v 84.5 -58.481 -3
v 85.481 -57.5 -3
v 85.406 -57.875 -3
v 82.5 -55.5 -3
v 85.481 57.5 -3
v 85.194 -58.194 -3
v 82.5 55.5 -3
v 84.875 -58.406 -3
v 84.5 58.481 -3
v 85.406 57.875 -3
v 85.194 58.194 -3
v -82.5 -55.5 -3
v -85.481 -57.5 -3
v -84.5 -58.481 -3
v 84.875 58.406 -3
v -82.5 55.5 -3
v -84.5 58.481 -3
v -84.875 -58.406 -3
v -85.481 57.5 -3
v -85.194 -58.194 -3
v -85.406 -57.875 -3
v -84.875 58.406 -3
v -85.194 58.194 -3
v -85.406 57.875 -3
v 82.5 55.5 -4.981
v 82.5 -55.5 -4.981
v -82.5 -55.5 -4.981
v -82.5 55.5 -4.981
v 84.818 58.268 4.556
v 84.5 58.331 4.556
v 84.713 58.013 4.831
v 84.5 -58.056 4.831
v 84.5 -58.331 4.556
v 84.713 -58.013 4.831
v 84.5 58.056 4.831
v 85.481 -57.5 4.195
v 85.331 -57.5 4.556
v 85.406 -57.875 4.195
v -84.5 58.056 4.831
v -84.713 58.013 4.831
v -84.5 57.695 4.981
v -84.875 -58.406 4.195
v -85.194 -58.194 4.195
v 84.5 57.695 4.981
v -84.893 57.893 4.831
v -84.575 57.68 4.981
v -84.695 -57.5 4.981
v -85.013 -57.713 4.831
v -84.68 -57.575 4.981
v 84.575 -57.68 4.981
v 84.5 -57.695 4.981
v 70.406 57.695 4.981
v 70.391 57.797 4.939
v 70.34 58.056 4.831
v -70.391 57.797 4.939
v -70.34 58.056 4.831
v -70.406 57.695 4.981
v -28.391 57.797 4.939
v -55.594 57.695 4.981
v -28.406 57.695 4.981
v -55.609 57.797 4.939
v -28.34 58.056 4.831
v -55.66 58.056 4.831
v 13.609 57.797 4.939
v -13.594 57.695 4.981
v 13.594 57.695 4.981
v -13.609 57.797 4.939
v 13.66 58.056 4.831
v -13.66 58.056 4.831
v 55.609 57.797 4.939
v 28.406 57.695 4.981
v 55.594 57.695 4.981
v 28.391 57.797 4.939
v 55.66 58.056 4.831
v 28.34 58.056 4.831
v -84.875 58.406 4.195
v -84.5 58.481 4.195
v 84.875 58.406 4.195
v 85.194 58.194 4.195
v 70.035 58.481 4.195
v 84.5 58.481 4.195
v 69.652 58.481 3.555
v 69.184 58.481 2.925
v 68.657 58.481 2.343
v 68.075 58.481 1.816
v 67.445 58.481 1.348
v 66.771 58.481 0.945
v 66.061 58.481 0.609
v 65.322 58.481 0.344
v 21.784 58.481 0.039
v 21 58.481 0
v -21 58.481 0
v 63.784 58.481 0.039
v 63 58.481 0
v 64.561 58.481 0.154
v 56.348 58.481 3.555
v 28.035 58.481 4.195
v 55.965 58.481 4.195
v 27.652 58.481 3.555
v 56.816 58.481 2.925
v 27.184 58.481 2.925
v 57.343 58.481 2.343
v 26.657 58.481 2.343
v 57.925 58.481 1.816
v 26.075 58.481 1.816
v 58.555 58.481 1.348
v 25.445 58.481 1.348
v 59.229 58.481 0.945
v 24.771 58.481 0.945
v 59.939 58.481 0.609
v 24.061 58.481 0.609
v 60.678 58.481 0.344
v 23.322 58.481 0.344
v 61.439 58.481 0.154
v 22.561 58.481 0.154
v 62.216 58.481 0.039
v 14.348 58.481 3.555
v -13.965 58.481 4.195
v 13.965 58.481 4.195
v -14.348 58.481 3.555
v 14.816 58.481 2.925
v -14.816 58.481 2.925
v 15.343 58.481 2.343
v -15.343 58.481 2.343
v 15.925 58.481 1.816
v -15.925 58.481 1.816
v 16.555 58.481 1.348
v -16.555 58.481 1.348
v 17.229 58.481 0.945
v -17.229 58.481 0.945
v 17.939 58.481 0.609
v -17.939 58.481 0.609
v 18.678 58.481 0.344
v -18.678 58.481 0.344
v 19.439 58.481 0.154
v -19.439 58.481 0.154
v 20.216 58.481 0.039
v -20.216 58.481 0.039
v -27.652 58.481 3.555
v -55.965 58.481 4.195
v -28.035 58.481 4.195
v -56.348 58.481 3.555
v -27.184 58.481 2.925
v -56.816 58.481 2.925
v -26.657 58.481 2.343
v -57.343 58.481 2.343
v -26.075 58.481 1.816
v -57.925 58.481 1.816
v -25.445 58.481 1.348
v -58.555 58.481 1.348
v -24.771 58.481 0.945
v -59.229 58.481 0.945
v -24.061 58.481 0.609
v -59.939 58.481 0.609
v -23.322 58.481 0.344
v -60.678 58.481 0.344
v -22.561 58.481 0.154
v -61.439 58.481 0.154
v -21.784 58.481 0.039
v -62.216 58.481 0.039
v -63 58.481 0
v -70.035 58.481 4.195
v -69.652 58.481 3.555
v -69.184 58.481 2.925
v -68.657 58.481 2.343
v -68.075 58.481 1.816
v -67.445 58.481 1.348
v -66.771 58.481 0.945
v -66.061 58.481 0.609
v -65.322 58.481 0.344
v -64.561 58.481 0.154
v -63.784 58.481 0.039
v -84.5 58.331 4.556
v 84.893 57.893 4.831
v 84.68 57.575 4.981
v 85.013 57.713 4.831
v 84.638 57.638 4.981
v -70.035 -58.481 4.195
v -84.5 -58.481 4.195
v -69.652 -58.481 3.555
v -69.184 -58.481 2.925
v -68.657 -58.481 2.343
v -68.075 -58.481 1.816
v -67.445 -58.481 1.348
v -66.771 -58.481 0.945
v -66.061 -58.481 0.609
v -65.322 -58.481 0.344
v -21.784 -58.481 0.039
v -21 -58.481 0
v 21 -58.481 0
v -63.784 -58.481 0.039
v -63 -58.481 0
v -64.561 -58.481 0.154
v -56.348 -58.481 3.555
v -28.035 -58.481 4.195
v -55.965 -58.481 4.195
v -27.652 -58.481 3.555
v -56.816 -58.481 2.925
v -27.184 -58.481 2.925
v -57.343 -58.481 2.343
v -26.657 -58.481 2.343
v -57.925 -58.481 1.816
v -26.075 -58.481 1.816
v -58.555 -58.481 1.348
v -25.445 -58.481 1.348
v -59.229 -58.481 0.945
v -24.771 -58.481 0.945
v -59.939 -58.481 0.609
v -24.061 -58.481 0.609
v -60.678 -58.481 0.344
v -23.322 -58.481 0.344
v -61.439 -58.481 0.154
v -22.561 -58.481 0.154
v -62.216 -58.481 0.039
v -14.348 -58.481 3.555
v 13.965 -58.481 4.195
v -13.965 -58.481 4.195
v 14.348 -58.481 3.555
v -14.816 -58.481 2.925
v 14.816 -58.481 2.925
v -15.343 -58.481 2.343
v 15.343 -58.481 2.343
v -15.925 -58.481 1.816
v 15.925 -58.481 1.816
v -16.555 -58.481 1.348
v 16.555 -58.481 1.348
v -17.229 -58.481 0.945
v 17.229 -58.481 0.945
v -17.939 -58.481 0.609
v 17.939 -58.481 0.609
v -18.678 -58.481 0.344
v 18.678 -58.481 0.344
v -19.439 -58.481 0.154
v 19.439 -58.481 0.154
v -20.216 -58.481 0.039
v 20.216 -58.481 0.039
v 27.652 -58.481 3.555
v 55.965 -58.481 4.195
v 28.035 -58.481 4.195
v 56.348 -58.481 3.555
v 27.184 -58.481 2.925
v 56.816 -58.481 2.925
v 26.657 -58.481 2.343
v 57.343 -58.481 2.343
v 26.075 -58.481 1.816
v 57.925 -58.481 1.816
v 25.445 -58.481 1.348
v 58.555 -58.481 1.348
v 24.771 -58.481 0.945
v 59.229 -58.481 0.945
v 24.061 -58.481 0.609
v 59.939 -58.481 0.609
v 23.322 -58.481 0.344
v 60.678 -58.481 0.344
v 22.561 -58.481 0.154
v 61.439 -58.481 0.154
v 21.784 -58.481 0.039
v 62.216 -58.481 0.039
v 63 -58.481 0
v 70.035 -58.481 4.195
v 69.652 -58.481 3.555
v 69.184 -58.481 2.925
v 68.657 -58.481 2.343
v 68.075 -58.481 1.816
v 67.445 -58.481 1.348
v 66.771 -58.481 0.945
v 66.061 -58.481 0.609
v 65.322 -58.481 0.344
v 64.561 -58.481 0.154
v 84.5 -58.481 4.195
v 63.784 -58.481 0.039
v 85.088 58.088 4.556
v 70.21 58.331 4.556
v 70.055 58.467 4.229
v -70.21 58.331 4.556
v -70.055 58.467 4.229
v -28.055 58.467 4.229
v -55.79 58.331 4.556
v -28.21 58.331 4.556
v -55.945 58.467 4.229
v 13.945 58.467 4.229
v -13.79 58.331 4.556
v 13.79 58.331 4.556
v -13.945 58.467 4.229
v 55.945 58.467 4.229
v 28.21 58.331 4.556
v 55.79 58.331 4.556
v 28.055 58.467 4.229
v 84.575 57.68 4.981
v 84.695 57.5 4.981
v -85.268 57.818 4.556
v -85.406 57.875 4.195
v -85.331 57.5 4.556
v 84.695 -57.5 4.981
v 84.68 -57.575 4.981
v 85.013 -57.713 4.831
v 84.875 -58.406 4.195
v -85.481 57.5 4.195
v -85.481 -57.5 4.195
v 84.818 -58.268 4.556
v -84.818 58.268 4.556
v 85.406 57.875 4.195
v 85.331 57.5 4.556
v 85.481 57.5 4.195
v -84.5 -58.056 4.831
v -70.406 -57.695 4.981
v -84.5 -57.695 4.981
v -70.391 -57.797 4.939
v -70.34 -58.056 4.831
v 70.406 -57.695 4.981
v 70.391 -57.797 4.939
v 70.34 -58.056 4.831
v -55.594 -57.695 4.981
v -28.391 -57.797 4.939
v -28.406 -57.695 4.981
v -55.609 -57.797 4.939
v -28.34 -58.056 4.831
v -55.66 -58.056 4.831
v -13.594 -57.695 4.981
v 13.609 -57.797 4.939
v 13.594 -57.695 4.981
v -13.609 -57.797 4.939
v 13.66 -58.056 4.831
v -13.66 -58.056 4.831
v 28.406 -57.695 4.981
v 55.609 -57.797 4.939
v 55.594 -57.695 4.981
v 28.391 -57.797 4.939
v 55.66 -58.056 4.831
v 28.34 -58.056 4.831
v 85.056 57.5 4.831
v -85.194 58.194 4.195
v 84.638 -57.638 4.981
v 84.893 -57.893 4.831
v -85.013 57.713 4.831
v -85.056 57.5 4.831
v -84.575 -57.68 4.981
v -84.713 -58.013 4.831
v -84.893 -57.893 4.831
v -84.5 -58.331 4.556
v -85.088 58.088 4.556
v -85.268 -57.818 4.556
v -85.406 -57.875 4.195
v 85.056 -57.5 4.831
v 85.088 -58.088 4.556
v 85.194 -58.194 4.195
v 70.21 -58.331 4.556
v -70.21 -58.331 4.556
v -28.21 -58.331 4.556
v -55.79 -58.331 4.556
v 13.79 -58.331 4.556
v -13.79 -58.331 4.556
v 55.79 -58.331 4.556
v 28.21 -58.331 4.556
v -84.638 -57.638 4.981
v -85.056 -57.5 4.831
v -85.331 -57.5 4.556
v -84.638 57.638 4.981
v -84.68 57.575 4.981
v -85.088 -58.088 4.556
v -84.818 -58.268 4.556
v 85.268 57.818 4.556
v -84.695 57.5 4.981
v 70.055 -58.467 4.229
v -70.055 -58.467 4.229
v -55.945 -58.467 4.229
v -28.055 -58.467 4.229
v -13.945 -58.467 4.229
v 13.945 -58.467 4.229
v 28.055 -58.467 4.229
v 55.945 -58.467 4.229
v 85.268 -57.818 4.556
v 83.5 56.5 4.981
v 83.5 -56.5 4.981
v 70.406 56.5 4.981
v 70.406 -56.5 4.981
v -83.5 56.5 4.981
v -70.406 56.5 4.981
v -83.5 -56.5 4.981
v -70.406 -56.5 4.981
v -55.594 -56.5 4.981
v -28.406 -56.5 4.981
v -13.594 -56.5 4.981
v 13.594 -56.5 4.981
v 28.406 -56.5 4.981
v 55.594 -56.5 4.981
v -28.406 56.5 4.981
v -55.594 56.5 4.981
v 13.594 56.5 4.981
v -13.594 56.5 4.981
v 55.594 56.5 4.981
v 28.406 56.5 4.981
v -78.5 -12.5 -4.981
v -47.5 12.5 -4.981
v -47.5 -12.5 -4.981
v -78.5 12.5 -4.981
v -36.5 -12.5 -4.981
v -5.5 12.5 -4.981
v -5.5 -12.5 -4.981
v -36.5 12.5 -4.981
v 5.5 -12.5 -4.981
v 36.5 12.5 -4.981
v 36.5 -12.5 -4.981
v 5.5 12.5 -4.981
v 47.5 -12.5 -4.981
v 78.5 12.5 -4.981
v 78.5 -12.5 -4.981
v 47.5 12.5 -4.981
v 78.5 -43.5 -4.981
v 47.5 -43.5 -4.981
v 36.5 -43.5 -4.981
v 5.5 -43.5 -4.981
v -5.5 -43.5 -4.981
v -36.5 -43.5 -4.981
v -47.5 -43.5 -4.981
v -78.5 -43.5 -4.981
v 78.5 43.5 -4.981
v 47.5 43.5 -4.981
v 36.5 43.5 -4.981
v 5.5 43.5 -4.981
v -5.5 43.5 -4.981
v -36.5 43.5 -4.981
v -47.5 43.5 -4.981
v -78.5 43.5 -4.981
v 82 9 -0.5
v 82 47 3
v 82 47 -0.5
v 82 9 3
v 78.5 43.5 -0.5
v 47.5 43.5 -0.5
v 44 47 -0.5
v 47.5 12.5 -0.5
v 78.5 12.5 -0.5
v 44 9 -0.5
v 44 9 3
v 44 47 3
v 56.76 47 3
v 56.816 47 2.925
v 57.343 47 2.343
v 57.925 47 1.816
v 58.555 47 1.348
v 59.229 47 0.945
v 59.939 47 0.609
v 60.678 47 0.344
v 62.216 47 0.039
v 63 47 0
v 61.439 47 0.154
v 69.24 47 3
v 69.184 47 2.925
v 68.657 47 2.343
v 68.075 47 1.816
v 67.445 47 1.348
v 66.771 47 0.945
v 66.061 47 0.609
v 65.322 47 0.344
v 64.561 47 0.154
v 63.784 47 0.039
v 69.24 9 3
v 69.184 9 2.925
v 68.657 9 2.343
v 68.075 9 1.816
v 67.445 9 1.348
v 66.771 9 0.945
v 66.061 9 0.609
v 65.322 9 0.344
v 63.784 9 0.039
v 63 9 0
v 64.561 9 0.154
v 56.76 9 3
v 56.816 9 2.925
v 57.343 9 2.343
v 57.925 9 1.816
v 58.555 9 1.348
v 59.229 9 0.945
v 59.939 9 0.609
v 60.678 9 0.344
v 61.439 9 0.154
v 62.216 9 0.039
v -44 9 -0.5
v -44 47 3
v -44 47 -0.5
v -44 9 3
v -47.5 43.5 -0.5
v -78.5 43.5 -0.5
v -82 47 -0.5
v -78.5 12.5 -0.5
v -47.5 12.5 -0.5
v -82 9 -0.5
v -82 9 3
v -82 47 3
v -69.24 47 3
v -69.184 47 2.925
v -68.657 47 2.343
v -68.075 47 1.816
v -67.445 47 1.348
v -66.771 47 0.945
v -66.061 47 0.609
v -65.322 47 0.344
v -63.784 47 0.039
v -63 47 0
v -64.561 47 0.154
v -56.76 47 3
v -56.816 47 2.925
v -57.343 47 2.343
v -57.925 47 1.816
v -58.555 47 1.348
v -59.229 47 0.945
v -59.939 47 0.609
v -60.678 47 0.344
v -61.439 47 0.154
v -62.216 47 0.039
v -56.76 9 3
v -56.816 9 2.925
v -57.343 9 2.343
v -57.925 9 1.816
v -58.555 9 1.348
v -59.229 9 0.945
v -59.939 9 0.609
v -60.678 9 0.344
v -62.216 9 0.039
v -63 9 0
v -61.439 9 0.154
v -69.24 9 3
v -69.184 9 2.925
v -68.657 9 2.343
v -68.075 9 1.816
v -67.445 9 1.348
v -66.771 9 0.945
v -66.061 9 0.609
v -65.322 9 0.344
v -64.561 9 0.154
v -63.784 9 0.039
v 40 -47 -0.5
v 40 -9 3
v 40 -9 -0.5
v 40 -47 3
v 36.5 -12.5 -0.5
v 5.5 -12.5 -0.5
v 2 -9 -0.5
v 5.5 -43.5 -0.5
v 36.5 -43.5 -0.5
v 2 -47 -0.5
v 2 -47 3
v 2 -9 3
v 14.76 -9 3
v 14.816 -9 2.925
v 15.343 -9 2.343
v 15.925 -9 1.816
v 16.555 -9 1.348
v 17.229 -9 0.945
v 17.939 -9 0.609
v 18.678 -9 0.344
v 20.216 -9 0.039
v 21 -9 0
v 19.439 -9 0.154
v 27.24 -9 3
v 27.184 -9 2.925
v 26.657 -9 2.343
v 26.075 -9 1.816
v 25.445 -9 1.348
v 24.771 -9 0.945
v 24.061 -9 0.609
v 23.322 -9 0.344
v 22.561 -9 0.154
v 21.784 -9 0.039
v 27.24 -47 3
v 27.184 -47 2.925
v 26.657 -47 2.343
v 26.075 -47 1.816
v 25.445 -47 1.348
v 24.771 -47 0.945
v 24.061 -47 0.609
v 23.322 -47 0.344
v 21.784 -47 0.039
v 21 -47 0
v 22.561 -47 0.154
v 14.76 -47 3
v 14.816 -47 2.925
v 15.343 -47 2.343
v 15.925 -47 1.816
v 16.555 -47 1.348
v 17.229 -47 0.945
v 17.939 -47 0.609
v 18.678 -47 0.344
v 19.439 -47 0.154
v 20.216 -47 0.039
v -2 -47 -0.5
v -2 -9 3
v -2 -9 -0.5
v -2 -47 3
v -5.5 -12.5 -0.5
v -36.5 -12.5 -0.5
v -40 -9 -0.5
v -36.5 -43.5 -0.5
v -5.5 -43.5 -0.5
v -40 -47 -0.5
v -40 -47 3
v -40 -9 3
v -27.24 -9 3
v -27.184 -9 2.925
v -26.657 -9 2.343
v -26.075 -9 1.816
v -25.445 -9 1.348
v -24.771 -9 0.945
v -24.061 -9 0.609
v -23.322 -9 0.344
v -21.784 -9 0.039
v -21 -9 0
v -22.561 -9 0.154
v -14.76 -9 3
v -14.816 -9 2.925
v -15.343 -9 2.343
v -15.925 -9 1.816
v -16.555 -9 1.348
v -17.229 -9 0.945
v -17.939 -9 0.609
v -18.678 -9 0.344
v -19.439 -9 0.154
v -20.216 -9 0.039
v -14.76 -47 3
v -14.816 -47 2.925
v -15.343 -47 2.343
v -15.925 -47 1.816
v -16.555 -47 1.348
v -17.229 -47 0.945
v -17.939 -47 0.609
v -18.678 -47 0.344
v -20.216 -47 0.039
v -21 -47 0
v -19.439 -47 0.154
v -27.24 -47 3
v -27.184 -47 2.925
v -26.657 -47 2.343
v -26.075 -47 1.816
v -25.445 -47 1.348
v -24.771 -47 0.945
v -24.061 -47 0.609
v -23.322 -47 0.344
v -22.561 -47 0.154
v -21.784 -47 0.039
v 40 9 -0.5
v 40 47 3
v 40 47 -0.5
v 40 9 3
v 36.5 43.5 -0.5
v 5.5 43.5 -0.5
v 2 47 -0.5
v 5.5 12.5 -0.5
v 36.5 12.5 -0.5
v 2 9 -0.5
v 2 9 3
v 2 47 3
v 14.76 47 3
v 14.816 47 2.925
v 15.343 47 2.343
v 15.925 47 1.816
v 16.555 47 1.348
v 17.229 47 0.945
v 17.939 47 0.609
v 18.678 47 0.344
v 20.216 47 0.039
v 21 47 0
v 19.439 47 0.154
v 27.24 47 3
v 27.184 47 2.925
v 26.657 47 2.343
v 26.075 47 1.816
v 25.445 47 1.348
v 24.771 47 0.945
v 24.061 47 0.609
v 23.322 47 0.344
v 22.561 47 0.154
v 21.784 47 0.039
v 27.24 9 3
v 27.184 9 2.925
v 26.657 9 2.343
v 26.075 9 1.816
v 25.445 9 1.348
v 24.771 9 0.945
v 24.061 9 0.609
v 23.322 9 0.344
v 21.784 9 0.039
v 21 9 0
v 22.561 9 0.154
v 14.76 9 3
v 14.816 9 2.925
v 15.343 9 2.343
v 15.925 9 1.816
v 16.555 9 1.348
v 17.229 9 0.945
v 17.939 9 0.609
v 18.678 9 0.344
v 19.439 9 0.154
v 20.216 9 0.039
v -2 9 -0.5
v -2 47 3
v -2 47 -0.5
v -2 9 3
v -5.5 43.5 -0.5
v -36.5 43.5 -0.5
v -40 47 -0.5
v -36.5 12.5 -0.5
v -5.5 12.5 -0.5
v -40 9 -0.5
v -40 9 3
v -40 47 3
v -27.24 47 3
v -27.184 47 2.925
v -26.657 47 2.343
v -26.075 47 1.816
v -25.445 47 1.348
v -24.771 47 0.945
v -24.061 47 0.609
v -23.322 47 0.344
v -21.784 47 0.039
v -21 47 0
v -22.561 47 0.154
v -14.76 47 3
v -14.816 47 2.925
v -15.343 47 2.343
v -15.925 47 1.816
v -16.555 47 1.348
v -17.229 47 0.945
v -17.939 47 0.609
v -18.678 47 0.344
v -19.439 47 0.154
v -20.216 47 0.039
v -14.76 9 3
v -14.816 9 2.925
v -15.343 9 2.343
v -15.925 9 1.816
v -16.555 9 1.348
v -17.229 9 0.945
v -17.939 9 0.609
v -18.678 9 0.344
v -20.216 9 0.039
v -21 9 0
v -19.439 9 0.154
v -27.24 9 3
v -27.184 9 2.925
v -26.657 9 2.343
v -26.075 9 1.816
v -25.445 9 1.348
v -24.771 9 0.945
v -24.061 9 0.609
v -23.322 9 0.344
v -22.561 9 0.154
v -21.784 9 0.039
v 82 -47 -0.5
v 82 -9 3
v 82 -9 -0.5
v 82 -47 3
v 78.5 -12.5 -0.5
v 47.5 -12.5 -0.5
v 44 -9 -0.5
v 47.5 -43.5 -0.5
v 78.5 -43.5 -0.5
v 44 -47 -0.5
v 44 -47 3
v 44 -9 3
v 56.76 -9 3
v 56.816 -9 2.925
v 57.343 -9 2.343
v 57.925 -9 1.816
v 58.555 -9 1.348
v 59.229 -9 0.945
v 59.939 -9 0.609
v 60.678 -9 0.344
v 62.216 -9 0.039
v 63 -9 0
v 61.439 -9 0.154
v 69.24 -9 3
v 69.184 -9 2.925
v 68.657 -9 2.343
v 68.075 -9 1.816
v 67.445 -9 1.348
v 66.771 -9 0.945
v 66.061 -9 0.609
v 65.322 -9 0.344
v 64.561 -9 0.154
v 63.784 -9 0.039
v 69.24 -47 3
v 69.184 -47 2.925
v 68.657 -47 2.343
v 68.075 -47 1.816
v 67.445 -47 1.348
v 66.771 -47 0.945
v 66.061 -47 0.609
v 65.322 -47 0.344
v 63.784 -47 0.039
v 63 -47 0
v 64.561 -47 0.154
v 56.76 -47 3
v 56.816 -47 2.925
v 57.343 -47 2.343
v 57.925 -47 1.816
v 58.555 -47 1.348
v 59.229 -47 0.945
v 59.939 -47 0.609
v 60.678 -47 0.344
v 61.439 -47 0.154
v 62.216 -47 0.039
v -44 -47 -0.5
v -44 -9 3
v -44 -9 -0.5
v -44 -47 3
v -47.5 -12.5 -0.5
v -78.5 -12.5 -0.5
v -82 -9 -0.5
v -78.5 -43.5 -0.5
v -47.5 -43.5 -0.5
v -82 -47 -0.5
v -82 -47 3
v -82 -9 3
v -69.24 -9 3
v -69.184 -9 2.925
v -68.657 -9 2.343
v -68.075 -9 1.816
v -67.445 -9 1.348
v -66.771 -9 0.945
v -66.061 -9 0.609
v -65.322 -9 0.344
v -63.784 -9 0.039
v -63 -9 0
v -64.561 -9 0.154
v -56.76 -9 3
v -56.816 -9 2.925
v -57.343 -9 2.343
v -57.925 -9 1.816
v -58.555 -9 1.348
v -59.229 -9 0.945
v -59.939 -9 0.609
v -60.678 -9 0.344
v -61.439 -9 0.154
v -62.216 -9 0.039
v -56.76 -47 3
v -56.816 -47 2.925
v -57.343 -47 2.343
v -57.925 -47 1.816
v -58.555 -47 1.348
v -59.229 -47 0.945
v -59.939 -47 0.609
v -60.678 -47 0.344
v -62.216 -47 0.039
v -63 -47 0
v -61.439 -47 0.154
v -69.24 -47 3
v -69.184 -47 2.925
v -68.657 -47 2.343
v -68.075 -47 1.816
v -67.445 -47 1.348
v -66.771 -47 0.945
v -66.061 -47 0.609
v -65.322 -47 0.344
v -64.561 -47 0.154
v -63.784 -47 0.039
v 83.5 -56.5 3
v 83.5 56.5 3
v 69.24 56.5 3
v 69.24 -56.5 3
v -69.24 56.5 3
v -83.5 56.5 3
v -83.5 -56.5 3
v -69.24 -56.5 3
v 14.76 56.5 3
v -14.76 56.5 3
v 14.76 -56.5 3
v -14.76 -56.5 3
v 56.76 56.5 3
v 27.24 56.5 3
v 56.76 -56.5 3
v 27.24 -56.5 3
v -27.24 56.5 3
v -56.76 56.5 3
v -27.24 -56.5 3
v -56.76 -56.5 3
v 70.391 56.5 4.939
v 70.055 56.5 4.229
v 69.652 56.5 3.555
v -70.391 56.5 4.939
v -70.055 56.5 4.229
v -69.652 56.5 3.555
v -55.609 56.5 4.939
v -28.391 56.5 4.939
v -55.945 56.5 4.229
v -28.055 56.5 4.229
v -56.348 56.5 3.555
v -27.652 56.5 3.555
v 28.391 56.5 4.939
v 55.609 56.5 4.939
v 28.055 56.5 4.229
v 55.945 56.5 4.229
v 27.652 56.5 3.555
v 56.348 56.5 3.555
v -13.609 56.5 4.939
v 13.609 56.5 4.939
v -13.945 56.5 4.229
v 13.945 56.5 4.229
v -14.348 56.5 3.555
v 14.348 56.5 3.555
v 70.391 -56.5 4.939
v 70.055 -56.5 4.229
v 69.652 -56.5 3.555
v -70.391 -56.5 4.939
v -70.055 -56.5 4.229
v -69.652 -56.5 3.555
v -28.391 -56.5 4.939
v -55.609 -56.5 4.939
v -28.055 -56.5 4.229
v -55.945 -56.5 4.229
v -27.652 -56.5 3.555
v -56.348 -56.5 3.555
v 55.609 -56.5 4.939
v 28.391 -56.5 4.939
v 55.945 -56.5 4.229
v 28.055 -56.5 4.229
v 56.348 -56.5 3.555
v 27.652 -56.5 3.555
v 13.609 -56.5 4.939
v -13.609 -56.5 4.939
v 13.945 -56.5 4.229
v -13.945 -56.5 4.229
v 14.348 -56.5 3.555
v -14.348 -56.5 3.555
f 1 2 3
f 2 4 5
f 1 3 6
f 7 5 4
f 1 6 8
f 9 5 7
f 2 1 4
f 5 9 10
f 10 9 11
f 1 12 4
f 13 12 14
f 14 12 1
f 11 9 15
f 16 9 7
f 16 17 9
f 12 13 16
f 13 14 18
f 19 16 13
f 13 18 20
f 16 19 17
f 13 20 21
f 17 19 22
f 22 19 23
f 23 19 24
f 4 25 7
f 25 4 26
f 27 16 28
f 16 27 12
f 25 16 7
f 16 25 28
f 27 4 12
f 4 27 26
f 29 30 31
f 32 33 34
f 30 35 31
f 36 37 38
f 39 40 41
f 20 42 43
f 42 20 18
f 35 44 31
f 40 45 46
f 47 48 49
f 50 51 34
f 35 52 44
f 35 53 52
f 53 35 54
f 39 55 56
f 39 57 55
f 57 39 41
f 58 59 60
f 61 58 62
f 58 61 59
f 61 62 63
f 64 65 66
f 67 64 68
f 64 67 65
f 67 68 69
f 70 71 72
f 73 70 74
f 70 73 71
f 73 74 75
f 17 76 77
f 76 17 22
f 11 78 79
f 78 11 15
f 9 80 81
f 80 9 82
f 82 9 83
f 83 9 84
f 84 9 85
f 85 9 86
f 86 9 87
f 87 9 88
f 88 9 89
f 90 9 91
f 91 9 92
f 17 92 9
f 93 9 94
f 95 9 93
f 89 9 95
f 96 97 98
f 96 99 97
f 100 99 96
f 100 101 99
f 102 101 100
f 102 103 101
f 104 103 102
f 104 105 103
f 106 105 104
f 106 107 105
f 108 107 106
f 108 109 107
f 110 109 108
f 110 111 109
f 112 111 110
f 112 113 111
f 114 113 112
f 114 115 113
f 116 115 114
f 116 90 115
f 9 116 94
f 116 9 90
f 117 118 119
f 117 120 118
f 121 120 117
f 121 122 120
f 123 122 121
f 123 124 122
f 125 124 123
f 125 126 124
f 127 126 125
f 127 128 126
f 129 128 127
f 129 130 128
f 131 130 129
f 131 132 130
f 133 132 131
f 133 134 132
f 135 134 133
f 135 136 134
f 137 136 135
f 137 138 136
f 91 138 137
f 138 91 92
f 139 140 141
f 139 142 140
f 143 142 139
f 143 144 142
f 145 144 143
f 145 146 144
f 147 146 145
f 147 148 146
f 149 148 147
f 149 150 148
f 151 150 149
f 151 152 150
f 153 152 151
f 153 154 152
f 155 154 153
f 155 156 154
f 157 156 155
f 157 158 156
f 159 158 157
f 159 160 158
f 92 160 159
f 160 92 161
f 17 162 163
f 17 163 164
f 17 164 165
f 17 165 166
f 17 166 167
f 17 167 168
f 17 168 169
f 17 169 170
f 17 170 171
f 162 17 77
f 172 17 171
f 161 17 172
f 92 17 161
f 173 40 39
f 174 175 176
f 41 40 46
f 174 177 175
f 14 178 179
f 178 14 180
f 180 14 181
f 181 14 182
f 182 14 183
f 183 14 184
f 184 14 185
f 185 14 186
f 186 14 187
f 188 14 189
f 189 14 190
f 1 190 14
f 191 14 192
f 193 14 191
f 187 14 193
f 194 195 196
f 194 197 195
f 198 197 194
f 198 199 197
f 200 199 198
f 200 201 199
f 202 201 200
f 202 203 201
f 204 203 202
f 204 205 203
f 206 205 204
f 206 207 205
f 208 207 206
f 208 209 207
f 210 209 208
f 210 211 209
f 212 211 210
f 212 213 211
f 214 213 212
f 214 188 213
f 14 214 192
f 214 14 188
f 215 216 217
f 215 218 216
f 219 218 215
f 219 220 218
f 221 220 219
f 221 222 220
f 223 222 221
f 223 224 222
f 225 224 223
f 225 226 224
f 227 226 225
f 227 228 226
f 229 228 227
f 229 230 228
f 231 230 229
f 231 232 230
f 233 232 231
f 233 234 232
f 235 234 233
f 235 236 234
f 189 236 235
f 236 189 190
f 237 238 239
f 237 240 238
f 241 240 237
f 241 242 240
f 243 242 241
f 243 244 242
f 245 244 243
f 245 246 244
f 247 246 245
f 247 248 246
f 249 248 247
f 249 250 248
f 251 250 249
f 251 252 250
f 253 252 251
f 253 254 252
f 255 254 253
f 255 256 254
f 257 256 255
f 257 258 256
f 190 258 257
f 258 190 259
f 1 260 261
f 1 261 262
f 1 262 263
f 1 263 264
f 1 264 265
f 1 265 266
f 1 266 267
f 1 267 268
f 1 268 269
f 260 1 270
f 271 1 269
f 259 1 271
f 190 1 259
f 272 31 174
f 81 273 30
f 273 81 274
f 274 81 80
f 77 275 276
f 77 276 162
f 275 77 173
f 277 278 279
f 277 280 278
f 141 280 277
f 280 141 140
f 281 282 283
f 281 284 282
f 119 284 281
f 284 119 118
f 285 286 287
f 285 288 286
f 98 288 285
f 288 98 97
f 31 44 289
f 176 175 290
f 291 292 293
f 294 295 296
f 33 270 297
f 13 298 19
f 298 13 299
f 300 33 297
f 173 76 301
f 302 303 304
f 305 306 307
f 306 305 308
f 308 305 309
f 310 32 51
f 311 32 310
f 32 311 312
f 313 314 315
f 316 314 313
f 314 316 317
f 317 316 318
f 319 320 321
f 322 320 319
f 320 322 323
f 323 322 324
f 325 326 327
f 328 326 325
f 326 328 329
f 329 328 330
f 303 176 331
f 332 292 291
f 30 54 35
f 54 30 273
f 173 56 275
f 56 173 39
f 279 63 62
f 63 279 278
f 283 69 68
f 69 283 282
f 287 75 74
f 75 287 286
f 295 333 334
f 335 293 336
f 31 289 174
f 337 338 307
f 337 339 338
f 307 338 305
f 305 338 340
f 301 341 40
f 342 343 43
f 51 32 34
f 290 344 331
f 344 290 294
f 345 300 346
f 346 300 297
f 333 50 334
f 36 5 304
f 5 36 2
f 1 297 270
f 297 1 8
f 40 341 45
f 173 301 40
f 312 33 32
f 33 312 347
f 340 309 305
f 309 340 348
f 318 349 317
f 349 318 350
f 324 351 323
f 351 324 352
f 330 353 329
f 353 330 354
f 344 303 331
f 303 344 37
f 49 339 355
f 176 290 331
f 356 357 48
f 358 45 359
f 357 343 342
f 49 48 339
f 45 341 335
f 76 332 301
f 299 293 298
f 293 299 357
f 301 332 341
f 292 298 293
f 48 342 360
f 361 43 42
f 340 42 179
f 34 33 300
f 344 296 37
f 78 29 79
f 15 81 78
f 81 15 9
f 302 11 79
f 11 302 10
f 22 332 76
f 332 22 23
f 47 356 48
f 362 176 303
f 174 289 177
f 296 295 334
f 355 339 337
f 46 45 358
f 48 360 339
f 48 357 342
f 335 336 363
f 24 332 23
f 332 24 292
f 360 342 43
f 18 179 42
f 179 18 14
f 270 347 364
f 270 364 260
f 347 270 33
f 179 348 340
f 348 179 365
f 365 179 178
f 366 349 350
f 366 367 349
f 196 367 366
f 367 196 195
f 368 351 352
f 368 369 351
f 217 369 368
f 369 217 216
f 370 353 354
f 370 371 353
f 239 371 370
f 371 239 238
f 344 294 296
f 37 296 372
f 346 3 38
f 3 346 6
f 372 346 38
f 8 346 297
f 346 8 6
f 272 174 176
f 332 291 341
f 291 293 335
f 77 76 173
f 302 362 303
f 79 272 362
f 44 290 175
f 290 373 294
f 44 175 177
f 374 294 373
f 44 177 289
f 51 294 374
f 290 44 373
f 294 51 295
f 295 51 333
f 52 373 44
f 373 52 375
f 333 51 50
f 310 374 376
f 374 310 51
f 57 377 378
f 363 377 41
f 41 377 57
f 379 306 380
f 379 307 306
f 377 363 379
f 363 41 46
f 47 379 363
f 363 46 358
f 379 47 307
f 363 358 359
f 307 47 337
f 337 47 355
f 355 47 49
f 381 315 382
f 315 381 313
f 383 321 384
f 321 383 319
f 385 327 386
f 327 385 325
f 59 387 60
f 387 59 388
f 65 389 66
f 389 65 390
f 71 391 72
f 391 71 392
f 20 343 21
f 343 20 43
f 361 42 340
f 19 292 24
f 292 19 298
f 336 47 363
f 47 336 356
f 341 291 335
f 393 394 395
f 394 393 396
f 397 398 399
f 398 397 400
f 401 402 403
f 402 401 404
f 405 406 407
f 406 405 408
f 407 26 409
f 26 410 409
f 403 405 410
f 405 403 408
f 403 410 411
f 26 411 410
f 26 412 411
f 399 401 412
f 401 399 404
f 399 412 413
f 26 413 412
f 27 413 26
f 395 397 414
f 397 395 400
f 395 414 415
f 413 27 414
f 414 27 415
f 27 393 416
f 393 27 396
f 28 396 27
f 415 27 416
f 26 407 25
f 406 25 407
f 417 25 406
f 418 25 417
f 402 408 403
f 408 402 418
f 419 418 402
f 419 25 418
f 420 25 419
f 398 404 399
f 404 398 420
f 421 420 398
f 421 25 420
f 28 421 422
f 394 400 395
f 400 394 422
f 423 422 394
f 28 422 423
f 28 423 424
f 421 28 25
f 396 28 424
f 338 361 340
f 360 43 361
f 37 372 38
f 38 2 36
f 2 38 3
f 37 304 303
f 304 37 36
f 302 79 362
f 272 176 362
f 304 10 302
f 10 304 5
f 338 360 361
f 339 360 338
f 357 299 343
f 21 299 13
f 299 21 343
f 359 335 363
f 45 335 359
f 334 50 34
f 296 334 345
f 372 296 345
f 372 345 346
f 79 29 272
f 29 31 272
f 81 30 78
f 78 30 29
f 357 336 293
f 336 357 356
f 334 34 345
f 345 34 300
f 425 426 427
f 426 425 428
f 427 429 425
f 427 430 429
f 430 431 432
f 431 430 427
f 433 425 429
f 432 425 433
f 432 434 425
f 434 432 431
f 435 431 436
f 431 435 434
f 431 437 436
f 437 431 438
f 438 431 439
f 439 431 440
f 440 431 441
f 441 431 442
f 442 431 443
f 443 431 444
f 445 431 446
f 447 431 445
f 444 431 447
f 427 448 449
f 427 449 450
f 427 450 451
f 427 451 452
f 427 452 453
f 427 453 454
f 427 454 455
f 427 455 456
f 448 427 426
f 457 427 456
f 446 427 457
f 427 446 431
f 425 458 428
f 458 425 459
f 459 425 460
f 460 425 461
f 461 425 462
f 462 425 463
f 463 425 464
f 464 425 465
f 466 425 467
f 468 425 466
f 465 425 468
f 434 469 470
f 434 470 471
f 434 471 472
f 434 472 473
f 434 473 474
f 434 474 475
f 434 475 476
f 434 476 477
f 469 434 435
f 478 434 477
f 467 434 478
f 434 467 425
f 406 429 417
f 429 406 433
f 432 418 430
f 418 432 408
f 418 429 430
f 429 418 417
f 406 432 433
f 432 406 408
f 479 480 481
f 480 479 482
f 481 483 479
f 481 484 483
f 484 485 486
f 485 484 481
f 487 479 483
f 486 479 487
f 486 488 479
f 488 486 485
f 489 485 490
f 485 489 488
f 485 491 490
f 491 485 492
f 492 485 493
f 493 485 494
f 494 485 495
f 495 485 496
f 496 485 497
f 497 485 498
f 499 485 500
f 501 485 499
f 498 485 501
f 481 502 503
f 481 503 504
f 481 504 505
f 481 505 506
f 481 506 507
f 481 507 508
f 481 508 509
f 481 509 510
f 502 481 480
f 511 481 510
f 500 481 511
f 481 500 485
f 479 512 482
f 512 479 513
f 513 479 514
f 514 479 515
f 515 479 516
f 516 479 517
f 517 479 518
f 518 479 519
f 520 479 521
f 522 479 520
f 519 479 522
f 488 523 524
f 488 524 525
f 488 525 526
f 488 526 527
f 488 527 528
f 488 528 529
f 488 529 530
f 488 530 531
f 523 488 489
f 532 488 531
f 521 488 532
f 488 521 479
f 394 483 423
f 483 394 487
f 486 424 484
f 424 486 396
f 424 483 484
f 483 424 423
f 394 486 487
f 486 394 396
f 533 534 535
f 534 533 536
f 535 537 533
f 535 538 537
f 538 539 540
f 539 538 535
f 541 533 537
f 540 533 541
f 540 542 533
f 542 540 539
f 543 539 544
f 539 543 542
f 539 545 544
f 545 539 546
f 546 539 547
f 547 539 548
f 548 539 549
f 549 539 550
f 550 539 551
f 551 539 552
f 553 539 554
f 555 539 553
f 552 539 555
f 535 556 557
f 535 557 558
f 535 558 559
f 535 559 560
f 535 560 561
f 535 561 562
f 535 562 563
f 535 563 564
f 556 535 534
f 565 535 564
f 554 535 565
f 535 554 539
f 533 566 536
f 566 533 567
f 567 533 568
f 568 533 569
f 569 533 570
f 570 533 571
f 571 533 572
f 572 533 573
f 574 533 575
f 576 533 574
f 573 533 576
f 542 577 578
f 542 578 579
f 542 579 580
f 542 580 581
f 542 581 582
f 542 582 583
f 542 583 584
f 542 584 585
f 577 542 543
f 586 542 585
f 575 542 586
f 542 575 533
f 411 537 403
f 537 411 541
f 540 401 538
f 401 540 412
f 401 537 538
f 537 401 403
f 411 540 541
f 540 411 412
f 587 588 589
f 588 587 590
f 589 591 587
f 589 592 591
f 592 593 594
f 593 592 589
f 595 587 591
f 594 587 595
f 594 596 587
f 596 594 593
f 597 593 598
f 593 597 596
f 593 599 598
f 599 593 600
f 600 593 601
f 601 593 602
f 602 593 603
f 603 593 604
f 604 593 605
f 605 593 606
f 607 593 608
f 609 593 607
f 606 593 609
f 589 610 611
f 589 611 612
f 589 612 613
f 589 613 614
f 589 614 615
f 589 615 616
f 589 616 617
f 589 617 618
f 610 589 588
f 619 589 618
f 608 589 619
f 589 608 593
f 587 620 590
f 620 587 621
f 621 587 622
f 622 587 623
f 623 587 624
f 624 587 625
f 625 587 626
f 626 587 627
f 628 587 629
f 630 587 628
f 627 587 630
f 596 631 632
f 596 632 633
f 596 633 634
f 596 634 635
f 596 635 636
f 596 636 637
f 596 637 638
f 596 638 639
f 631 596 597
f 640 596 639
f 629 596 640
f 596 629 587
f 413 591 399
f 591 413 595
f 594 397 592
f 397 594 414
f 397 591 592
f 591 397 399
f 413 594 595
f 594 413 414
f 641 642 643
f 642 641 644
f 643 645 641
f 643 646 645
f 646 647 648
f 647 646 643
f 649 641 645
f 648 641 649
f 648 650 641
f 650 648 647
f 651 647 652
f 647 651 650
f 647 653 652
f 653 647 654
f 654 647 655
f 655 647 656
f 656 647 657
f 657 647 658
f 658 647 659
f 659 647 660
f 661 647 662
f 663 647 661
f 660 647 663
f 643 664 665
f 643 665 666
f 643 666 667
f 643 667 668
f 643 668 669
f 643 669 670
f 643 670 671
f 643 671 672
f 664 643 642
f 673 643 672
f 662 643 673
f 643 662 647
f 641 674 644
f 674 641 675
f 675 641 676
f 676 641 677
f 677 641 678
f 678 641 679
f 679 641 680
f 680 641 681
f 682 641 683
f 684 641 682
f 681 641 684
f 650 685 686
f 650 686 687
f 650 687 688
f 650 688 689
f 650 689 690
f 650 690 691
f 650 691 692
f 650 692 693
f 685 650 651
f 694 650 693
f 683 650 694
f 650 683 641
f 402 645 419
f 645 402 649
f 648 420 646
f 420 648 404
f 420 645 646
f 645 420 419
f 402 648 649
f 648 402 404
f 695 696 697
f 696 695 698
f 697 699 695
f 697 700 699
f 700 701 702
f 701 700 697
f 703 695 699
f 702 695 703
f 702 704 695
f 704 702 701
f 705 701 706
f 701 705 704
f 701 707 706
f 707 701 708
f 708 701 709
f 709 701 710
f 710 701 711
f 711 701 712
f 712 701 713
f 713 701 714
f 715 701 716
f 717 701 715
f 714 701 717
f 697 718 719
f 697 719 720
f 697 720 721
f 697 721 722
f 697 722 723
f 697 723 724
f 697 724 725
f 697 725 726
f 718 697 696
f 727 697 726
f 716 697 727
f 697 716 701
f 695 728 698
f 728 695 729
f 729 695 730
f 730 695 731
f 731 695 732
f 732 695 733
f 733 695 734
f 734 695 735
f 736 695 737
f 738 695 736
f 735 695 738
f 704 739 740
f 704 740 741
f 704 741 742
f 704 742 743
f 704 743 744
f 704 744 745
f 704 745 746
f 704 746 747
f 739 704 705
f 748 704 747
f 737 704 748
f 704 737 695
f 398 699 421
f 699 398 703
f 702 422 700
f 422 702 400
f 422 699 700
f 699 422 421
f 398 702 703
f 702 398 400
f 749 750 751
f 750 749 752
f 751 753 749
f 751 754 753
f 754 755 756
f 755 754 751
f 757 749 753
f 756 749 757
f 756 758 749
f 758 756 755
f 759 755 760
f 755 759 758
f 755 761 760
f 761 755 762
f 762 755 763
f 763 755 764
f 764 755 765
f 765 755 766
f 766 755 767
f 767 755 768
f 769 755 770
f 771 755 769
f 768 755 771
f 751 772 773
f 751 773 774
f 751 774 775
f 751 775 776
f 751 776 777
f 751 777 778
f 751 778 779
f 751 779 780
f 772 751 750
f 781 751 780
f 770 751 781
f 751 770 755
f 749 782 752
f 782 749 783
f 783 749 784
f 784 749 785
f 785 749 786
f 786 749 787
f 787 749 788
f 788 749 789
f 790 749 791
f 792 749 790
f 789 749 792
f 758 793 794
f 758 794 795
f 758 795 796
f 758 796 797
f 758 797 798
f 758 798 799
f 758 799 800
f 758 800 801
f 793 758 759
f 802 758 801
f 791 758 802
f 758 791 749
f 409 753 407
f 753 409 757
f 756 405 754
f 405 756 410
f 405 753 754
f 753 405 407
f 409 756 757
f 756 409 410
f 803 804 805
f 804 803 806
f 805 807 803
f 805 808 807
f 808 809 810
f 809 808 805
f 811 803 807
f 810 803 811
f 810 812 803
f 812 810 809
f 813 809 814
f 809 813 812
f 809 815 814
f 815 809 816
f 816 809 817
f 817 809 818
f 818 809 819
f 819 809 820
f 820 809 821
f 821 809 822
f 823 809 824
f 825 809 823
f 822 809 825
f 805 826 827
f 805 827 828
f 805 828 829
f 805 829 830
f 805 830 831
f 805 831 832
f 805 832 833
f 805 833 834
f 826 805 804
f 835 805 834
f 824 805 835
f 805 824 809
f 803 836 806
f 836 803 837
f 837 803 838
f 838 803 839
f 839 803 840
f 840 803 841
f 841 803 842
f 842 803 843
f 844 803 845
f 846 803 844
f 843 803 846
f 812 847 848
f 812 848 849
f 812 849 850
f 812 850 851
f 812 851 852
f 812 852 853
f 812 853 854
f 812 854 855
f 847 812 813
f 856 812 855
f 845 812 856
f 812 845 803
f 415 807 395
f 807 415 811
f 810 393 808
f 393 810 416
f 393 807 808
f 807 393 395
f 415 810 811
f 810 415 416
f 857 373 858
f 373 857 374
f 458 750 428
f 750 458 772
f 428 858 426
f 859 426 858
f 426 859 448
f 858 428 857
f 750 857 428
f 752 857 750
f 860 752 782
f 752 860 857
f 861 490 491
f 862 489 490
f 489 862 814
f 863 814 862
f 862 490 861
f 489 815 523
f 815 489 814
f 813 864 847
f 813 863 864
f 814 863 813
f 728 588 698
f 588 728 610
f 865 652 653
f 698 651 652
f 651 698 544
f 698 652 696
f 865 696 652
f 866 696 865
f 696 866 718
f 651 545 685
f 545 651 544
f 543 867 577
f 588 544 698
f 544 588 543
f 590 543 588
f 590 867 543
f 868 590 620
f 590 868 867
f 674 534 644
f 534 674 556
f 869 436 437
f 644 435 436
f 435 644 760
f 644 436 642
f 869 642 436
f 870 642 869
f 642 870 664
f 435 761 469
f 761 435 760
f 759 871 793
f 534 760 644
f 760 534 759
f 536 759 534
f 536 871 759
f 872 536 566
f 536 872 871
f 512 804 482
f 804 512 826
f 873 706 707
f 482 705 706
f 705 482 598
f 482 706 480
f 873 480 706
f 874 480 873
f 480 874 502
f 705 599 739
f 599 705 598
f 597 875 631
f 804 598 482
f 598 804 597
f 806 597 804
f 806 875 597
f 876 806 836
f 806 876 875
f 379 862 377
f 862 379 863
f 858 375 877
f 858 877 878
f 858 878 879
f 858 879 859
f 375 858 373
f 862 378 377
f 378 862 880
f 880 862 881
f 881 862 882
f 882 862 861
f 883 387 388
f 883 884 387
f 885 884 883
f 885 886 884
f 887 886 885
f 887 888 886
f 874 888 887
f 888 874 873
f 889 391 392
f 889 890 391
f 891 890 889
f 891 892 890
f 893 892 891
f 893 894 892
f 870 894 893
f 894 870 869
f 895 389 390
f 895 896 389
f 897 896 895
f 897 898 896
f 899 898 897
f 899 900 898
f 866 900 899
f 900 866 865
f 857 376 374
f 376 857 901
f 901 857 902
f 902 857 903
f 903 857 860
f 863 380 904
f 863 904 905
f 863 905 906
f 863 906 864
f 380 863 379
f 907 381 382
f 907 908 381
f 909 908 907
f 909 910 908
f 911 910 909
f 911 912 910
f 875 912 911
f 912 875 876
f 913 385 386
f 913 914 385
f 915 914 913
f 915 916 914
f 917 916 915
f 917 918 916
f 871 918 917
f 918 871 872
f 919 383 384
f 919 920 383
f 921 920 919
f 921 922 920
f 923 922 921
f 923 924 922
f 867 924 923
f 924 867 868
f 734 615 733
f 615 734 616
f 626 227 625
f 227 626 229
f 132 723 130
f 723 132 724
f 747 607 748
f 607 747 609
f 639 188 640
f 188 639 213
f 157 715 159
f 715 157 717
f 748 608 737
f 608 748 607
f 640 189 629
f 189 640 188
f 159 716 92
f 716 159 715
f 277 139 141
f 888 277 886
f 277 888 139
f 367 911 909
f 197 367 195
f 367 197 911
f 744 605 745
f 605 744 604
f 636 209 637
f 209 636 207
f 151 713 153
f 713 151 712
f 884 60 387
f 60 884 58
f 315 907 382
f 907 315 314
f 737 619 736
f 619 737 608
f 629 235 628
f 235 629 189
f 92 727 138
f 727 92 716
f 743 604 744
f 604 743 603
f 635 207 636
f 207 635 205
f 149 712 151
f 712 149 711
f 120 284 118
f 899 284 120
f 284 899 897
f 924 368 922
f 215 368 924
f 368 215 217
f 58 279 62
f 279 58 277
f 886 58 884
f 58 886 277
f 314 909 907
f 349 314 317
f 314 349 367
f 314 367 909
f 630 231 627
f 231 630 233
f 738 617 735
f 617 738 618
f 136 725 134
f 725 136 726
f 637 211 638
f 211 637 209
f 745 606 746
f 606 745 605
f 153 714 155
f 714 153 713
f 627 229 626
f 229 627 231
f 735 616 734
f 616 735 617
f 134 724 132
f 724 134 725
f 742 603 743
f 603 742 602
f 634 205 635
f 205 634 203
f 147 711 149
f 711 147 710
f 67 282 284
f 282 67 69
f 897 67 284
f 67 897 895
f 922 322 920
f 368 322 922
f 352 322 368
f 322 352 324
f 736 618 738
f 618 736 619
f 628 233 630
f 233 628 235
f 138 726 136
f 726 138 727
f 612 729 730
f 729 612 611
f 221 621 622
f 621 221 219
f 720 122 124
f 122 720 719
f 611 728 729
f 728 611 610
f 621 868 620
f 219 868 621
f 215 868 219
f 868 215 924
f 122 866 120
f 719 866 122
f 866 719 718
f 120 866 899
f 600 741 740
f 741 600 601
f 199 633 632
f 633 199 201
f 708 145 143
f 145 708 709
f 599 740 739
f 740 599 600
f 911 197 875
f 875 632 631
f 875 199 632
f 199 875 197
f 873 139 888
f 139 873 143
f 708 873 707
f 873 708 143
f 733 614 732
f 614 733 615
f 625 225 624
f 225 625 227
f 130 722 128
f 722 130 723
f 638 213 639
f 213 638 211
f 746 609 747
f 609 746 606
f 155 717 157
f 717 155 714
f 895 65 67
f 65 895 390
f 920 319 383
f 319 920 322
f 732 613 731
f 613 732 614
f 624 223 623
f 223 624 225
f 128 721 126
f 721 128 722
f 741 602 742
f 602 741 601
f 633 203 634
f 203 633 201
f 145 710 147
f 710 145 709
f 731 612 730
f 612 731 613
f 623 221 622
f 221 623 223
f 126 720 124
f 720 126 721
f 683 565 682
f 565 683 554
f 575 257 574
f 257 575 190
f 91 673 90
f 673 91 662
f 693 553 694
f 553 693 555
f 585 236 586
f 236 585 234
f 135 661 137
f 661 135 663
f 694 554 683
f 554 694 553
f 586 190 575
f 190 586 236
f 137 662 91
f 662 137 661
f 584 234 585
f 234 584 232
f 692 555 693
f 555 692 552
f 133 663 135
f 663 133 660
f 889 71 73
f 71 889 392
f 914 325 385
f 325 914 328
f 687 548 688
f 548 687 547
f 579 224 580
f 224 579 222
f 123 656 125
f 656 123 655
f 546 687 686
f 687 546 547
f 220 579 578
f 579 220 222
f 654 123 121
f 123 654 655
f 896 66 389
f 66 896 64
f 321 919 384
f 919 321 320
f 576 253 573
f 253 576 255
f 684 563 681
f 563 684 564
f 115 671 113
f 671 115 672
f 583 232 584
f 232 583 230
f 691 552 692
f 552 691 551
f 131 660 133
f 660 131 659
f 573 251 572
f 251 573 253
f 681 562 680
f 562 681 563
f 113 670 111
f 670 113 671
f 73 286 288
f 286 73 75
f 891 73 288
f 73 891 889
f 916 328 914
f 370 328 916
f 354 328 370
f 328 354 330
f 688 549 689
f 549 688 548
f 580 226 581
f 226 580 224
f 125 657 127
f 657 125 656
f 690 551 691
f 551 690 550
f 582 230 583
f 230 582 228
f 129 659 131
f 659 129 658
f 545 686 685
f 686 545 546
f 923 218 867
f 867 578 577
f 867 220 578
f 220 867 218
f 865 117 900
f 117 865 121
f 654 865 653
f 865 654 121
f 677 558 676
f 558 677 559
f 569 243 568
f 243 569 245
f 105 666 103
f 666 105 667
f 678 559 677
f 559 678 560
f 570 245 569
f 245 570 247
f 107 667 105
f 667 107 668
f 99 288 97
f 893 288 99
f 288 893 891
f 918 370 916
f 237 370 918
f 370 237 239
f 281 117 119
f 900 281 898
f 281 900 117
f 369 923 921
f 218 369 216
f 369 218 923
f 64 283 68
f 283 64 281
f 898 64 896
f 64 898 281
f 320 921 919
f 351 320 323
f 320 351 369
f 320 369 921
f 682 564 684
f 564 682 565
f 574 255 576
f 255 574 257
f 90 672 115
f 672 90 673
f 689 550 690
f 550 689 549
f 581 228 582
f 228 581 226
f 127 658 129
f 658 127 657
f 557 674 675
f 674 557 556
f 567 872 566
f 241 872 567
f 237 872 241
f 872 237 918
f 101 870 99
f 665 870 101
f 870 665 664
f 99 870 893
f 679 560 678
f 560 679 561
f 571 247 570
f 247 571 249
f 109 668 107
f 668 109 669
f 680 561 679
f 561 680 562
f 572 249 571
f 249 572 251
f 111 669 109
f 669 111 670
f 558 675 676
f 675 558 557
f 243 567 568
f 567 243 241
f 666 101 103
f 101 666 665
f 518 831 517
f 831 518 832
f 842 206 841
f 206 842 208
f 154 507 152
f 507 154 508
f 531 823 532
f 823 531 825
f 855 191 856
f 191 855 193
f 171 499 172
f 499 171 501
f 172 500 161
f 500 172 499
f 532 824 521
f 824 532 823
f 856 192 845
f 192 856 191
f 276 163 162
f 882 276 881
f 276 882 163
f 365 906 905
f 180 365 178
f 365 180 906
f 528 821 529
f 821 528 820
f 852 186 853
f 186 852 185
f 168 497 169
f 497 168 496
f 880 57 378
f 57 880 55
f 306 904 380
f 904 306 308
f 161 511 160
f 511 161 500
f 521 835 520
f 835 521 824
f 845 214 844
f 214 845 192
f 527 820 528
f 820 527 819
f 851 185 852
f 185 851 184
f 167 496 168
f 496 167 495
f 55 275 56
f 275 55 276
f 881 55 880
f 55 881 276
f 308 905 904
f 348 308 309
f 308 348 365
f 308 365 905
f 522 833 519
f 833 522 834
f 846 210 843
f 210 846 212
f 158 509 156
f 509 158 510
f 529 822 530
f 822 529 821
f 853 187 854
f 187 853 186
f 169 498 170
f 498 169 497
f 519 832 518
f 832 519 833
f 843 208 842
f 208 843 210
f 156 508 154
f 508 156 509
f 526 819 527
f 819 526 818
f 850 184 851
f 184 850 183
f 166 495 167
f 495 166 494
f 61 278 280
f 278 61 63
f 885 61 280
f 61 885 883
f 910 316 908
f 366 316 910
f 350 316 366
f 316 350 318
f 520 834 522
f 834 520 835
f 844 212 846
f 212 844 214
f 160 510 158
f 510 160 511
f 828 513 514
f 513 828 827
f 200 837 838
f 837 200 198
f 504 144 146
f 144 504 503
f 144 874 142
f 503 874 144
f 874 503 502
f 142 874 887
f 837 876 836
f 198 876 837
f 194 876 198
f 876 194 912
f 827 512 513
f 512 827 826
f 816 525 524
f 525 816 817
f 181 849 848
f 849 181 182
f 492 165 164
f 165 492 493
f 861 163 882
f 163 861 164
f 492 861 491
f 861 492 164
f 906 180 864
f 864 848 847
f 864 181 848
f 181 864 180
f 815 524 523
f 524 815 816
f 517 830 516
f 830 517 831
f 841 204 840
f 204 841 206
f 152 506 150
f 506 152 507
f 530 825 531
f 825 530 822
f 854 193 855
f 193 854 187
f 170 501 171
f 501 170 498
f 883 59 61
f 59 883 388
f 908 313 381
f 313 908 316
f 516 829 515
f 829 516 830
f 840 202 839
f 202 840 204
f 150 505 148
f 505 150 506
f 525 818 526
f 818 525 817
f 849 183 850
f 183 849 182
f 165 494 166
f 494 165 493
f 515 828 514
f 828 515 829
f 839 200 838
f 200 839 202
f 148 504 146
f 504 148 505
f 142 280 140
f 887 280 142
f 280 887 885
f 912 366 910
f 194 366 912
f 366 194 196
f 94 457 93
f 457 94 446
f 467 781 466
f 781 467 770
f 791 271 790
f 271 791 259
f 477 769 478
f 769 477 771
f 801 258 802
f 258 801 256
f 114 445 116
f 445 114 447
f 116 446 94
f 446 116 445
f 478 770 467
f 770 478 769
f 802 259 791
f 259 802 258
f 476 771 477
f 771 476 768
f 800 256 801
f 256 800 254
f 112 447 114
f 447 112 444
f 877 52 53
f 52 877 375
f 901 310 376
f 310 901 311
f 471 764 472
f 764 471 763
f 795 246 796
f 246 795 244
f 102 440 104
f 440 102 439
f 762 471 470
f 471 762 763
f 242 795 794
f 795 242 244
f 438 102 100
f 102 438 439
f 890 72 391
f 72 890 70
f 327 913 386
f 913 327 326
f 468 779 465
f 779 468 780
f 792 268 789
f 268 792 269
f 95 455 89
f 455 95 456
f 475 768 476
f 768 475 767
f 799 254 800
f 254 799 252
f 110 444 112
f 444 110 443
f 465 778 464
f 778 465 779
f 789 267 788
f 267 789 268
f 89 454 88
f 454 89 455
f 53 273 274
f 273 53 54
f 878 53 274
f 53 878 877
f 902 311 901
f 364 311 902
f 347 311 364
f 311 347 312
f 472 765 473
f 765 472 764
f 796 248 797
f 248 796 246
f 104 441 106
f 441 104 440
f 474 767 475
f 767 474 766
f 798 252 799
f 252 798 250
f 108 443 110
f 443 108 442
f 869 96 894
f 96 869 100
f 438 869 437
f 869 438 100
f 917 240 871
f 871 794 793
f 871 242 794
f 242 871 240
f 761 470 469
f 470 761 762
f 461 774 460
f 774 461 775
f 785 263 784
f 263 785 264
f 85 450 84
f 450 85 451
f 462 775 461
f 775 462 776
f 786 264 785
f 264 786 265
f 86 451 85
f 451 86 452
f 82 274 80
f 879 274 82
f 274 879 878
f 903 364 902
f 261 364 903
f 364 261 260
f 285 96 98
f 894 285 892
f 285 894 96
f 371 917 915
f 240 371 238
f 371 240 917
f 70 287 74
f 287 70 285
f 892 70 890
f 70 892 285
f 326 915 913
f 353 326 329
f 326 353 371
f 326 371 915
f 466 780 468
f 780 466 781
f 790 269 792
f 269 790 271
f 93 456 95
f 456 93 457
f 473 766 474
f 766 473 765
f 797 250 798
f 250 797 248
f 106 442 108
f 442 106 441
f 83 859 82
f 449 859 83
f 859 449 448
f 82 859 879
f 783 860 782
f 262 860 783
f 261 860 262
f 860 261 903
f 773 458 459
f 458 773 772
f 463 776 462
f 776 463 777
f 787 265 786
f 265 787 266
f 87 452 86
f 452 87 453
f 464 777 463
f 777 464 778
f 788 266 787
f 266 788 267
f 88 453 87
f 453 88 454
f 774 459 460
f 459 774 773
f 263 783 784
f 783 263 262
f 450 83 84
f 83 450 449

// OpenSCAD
// Base
module base_ppal() {
    // Partes a sumar
    difference(){
        minkowski(){
            sphere(1, $fn=16);
            cube ([169, 115, 8], center = true);
        }
        
    // Partes a restar (Hueco parte inferior, para calzar en otro tray)   
    difference() { 
        translate([0,0, -7 ]) cube ([200, 150, 8], center = true);
        translate([0,0, -7 ]) cube ([165, 111, 8], center = true);
        
    }
    }
}


// Cuerpo del micro
module micro() {
    // Cuerpo del micro
    translate([0,0, 7 ]) cube ([38, 38, 10], center = true);
    // Pines del micro
    translate([0,0,-1 ]) cube ([31, 31,  7], center = true); //achicado 1mm
}


//Tray
module tray() {
    difference() {
        union() {
            base_ppal();

        }
        // Partes a restar 
        union(){
            translate([ 63, 28,-2.5 ]) micro();
            translate([-63, 28,-2.5 ]) micro();     
            
            translate([ 21 ,-28,-2.5 ]) micro();
            translate([-21 ,-28,-2.5 ]) micro(); 
            
            translate([ 21 , 28,-2.5 ]) micro();
            translate([-21 , 28,-2.5 ]) micro();             
     
            translate([ 63,-28,-2.5 ]) micro();
            translate([-63,-28,-2.5 ]) micro();  
            
            // Hueco parte superior, para calzar en otro tray   
            translate([0,0, 7 ]) cube ([167, 113, 8], center = true);

            // Huecos para los dedos, para poder retirar los micros mas facil
            rotate ([ 0, 90, 90]) translate ([-8, 21,0]) cylinder(200, 8,8, $fn=64, center=true);
            rotate ([ 0, 90, 90]) translate ([-8,-21,0]) cylinder(200, 8,8, $fn=64, center=true);  
            rotate ([ 0, 90, 90]) translate ([-8, 63,0]) cylinder(200, 8,8, $fn=64, center=true);
            rotate ([ 0, 90, 90]) translate ([-8,-63,0]) cylinder(200, 8,8, $fn=64, center=true);   
            
        }
    }
}


 tray();
